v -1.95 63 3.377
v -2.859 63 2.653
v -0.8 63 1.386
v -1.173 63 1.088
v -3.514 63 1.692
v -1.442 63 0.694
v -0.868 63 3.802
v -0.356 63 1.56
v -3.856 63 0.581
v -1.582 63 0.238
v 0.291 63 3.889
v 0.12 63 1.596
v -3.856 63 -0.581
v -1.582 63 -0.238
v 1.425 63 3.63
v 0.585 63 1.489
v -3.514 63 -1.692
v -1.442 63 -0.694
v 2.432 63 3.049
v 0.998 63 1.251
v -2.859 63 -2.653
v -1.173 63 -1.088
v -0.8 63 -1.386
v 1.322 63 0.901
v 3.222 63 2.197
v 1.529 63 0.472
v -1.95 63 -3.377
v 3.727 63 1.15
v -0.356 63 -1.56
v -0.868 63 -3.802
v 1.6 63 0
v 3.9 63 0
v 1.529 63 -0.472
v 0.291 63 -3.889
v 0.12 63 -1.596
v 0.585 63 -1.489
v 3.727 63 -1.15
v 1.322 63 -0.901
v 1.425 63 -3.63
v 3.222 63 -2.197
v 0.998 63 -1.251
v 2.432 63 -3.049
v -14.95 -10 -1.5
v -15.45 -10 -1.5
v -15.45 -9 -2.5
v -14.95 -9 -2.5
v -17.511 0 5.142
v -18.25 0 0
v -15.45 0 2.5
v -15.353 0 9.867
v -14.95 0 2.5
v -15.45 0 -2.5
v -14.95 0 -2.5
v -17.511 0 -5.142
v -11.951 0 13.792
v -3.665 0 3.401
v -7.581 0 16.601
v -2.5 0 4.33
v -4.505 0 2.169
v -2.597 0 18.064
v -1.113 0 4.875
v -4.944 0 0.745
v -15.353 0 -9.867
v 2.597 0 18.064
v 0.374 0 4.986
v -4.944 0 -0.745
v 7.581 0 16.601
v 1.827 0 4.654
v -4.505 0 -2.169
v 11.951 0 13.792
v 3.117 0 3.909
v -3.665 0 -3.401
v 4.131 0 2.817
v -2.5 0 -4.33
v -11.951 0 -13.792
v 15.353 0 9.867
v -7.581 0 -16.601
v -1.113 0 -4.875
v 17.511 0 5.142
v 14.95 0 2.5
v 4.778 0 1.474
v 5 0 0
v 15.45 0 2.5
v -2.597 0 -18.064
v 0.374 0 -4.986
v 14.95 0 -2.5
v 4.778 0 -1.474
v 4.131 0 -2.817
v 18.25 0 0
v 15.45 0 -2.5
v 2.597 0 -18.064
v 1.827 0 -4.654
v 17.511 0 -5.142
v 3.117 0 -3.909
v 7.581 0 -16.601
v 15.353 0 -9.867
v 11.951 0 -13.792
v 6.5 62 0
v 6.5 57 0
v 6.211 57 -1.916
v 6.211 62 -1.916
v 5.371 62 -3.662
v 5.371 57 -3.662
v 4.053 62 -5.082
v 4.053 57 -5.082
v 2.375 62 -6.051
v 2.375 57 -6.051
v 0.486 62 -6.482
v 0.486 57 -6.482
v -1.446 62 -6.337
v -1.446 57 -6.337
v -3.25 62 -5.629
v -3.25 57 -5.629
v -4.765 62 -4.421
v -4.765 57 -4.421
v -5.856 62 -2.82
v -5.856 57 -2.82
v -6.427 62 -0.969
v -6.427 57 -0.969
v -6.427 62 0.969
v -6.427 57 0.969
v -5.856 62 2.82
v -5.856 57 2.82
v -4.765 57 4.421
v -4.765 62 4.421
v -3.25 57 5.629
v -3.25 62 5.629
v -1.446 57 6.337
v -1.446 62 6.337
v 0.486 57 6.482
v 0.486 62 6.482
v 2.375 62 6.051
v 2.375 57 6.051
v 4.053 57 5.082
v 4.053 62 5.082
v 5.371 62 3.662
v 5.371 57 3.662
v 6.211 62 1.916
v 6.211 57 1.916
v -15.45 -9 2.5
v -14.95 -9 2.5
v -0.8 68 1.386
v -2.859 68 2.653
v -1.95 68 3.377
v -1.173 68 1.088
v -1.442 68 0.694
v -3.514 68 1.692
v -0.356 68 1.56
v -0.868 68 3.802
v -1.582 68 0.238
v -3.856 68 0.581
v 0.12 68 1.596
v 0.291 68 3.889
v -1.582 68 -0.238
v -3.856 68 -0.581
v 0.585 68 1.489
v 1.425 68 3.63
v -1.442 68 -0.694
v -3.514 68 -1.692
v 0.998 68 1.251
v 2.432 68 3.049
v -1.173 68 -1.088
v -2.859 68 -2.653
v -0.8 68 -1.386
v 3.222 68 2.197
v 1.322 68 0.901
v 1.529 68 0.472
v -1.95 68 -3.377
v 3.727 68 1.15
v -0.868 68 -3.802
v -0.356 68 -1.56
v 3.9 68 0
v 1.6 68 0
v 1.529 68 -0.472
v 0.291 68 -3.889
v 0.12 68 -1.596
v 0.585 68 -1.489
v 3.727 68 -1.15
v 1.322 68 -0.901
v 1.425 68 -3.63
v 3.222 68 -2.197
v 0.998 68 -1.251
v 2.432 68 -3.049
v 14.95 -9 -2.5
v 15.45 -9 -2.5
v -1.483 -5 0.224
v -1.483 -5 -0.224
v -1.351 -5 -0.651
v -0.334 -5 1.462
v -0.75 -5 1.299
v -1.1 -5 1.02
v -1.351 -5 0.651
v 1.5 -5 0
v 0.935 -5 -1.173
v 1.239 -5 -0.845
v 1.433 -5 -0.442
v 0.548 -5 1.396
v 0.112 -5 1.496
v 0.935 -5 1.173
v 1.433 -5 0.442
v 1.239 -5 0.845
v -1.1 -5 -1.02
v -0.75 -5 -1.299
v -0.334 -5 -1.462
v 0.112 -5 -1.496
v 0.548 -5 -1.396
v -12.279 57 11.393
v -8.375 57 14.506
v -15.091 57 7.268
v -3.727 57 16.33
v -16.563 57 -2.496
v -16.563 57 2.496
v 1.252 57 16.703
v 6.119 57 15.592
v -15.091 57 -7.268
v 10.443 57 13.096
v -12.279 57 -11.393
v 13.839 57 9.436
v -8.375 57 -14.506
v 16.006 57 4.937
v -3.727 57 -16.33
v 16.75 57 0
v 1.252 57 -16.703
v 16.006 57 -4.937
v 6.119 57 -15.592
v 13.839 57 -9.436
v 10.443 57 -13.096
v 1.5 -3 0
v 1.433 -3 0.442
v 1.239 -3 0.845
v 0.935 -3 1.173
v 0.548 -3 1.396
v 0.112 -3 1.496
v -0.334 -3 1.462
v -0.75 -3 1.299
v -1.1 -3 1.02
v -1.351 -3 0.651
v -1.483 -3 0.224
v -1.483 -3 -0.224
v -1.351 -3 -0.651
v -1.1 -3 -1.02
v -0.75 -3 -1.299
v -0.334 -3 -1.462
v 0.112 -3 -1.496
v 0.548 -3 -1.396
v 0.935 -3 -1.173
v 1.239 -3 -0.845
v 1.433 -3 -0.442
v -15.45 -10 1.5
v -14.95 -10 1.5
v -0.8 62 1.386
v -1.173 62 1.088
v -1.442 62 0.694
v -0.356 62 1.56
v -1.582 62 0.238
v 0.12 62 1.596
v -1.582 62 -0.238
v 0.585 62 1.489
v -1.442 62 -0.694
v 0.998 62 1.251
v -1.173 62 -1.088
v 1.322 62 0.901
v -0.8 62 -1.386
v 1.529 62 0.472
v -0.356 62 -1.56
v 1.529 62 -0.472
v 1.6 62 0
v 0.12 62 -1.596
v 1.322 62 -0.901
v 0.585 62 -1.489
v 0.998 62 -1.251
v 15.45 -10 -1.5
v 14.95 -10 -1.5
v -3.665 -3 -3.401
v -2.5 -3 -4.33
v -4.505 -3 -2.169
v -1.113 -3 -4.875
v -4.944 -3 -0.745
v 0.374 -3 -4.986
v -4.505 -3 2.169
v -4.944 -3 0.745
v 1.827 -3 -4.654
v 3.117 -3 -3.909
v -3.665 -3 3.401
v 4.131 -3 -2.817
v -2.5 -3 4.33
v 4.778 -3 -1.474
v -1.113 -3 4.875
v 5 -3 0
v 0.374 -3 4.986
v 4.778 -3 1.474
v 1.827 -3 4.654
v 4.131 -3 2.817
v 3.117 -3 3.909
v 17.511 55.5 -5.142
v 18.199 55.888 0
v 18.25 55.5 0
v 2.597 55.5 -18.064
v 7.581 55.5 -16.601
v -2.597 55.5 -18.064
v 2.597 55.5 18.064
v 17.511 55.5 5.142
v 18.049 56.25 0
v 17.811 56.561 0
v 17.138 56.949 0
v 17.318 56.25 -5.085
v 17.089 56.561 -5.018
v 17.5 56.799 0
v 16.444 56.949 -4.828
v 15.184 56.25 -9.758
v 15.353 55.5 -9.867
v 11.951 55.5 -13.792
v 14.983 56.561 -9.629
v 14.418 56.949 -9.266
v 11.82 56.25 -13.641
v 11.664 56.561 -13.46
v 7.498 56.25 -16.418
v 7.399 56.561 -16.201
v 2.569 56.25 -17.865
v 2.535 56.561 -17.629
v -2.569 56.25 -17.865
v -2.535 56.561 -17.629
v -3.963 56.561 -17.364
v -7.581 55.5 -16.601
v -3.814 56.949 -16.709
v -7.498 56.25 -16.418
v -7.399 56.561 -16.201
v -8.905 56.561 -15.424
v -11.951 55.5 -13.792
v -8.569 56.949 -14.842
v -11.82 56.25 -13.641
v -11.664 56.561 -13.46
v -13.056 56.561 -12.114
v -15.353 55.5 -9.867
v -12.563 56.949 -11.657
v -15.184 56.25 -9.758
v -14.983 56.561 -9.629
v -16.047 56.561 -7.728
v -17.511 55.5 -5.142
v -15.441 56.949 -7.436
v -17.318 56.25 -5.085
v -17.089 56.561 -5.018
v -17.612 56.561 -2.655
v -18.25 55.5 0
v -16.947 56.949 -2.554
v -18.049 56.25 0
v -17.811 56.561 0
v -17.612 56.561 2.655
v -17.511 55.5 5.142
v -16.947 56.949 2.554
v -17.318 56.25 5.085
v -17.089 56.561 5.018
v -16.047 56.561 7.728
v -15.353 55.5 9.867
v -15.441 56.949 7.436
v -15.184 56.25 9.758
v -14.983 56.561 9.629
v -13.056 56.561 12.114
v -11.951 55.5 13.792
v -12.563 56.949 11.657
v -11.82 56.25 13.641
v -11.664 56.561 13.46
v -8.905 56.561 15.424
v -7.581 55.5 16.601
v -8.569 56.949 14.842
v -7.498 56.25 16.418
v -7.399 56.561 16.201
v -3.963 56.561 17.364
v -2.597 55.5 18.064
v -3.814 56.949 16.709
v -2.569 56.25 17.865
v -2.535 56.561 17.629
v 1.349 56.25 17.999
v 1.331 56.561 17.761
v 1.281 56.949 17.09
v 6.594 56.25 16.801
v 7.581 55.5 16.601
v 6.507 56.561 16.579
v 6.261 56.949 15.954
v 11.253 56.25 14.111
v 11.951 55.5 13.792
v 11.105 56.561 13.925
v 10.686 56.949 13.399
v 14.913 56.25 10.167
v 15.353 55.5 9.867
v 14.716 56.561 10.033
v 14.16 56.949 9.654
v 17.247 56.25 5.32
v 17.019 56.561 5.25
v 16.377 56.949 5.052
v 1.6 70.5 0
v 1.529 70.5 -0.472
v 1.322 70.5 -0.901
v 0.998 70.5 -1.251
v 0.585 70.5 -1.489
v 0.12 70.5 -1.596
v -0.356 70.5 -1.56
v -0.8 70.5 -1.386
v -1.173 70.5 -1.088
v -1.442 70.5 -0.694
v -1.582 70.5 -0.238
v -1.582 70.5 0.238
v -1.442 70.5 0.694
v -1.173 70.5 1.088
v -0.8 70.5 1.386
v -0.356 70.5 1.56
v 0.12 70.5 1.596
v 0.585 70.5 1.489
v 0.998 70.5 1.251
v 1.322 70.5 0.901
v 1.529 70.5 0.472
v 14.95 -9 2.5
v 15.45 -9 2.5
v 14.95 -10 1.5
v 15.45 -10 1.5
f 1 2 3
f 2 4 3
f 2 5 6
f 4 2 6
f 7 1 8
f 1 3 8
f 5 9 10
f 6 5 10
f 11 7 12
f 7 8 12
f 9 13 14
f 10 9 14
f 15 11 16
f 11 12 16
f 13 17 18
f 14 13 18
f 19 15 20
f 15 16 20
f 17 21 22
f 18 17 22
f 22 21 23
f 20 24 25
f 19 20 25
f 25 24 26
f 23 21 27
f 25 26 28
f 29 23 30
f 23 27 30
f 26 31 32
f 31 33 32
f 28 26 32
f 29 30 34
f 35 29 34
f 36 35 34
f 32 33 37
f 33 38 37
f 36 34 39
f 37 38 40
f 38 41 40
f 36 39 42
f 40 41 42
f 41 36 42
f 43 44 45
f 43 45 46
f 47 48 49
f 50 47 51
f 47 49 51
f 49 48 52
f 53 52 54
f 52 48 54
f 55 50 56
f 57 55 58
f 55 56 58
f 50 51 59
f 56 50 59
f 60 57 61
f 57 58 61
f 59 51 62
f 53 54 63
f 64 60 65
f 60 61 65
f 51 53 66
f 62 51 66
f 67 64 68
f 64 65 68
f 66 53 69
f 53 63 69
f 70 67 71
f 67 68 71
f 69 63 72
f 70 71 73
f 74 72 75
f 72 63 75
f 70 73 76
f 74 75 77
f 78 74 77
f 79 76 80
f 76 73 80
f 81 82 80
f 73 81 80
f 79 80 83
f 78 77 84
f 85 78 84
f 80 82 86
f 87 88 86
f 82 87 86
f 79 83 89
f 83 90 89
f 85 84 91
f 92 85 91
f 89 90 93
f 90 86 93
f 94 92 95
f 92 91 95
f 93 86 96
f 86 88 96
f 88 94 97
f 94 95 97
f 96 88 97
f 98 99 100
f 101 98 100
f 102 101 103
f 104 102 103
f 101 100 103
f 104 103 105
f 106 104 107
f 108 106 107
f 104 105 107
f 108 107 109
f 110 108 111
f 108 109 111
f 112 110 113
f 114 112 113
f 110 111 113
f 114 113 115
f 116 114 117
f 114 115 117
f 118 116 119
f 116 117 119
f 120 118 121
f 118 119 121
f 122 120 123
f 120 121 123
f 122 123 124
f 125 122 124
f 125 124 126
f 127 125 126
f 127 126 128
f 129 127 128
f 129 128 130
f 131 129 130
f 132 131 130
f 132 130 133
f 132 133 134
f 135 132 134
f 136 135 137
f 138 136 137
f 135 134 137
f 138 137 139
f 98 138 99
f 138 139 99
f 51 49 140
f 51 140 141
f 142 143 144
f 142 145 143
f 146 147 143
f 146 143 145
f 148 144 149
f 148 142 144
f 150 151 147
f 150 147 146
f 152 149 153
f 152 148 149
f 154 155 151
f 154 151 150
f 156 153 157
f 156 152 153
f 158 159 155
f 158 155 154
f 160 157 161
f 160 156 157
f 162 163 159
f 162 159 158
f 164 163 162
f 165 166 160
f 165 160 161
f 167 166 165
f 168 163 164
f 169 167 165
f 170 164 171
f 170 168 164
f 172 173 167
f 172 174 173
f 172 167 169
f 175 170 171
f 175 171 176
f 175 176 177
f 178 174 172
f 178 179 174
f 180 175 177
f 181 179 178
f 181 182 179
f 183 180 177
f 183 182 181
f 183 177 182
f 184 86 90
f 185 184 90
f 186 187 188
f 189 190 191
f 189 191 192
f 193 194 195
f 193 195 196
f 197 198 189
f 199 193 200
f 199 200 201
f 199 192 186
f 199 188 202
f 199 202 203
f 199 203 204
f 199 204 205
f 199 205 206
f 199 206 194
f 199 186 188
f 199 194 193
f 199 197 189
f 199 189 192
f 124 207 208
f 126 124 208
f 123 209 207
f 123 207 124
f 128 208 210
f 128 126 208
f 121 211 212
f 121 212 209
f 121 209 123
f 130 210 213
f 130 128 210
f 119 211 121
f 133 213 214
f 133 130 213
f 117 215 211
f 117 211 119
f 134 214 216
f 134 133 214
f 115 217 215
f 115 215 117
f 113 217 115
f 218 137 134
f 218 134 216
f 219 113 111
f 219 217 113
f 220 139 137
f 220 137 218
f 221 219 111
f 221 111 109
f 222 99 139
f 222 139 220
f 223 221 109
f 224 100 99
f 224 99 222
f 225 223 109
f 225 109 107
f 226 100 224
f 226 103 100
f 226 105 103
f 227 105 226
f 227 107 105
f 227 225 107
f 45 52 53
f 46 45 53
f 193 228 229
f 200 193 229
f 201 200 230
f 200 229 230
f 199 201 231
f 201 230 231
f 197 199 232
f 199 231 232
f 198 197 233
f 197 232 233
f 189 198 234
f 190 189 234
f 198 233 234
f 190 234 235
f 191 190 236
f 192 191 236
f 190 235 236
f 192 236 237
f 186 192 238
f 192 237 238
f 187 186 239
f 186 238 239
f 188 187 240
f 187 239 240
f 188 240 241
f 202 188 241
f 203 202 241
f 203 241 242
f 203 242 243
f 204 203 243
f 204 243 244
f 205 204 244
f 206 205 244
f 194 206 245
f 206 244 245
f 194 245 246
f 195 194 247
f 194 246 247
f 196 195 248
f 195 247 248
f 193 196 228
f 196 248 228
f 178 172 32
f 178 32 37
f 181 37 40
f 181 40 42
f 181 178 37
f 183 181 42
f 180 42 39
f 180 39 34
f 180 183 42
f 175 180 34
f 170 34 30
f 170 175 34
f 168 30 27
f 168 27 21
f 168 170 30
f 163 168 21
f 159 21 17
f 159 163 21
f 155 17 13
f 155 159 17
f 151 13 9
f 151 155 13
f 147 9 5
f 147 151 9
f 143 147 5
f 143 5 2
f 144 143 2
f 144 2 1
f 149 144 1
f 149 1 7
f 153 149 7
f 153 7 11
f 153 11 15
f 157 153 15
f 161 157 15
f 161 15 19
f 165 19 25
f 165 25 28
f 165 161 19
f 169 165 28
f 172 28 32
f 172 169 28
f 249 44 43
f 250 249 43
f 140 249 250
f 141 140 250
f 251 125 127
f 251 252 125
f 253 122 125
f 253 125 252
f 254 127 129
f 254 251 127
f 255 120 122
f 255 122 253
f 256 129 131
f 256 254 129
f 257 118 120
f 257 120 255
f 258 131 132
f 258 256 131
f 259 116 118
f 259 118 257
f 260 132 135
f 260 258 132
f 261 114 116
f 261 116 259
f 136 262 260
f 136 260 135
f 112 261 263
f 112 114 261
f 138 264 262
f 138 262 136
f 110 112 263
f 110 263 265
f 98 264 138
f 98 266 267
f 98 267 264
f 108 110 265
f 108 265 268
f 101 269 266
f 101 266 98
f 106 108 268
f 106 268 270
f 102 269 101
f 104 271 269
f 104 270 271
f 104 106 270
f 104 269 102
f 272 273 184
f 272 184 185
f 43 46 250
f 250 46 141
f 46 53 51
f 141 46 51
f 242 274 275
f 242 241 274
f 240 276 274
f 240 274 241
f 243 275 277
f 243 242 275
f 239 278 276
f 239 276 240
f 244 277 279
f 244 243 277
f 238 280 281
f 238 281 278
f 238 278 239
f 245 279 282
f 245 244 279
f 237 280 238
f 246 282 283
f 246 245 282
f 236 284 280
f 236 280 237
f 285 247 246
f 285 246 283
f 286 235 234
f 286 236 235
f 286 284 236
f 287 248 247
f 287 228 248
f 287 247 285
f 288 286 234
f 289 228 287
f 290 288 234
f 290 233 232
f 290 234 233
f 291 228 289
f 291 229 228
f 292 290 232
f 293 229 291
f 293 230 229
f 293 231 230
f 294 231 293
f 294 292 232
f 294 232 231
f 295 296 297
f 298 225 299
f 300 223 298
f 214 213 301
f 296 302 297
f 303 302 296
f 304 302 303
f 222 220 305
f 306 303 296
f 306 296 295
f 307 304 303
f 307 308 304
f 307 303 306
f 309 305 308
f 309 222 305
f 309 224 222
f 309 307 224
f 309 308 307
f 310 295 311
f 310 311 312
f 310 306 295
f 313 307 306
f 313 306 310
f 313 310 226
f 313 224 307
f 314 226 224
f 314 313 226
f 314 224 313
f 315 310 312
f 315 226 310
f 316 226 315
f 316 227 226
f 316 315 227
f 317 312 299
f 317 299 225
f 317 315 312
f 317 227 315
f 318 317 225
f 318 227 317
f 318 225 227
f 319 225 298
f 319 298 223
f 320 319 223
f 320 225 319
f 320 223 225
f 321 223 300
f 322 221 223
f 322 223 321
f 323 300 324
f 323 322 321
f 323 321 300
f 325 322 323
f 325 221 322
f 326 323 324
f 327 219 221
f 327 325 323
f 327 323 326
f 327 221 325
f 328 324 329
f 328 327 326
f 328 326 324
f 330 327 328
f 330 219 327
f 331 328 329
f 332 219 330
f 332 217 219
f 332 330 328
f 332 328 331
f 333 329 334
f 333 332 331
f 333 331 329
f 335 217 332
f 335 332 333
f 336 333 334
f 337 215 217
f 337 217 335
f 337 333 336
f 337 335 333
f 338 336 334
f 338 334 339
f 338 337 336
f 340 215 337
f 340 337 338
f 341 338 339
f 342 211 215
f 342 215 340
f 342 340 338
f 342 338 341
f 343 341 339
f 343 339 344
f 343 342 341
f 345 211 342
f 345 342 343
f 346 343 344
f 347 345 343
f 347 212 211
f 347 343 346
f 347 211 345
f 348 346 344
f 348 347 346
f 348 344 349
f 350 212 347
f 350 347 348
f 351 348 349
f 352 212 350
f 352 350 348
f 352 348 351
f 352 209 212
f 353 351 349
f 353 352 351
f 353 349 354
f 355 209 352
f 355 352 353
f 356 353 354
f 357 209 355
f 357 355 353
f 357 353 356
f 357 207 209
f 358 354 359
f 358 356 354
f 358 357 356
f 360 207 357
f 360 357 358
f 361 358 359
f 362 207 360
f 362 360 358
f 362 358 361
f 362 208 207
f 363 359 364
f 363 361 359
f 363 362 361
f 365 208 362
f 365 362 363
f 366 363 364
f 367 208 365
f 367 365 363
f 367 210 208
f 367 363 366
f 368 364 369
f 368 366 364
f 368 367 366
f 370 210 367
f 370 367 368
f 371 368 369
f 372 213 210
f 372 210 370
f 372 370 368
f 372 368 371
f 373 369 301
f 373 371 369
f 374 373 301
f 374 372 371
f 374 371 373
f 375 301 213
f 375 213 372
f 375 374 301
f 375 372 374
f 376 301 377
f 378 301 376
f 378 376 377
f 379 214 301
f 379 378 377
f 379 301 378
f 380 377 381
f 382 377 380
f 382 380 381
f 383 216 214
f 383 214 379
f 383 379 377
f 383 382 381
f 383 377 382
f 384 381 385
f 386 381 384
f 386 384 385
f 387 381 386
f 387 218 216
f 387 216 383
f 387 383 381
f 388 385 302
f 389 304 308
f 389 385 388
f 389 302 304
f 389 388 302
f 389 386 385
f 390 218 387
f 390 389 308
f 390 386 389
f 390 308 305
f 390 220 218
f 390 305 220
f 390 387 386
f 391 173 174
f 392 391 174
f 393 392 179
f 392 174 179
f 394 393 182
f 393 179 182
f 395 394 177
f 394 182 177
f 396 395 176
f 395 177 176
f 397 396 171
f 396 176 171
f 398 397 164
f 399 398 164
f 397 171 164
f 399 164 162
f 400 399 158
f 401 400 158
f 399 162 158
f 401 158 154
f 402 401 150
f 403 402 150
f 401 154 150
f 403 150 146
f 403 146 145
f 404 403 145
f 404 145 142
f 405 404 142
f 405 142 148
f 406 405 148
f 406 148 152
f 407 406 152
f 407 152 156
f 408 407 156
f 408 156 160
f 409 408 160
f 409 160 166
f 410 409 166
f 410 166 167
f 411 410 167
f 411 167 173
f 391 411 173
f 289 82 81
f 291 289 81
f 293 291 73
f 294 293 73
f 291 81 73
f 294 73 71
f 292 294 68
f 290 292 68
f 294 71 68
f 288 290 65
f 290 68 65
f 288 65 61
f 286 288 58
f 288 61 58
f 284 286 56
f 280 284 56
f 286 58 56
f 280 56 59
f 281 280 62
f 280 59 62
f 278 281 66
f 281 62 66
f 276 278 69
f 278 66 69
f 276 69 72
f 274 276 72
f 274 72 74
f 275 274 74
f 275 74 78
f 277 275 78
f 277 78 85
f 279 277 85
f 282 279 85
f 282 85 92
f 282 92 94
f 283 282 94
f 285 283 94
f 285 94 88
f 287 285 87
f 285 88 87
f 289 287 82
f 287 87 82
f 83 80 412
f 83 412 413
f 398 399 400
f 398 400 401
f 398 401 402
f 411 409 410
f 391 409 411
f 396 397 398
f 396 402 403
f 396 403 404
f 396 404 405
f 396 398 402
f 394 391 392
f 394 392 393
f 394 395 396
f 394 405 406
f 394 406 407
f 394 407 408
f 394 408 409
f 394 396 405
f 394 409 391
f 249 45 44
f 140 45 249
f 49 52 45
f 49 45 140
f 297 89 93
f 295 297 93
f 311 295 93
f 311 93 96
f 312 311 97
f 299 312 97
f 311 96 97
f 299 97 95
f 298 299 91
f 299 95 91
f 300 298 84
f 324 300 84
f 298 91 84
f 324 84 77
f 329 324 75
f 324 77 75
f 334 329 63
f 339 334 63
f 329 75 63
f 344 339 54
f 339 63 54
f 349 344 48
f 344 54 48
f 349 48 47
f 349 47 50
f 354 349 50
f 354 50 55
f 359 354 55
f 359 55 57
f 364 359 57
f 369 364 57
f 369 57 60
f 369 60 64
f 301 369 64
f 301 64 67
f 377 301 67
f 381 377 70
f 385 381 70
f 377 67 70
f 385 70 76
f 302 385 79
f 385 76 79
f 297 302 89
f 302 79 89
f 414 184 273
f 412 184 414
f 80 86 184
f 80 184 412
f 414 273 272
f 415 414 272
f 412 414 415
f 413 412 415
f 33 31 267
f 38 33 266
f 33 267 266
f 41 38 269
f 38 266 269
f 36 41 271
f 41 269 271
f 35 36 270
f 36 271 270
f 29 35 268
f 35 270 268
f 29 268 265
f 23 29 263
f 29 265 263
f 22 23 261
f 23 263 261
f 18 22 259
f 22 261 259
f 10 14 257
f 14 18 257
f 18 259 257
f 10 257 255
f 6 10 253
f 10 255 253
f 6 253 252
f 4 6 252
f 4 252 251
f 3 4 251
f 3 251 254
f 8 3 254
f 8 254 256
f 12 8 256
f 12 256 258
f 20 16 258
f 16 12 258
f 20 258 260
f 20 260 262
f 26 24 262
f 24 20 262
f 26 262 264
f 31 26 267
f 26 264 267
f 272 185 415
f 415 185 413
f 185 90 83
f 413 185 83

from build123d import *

# Parameters (mm, degrees)
SKETCH1_R           = 18.25
BOSS_EXTRUDE1_DEPTH = 57
SKETCH2_R           = 6.5
BOSS_EXTRUDE2_DEPTH = 5
FILLET1_R           = 1.5
SKETCH3_R           = 1.6
BOSS_EXTRUDE3_DEPTH = 8.5
BOSS_EXTRUDE4_START = -2.5
SKETCH4_R           = 3.9
BOSS_EXTRUDE4_DEPTH = 5
SKETCH5_R           = 5
BOSS_EXTRUDE5_DEPTH = 3
SKETCH6_R           = 1.5
BOSS_EXTRUDE6_DEPTH = 2
SKETCH7_W           = 0.5
SKETCH7_H           = 5
BOSS_EXTRUDE7_DEPTH = 10
CHAMFER1_SIZE       = 1


with BuildPart() as part:
    # Sketch1 → Boss-Extrude1 (new body)
    with BuildSketch(Plane(origin=(0, 0, 0), x_dir=(1, 0, 0), z_dir=(0, 1, 0))):
        Circle(SKETCH1_R)
    extrude(amount=BOSS_EXTRUDE1_DEPTH)

    # Sketch2 → Boss-Extrude2 (add)
    with BuildSketch(Plane(origin=(0, 57, 0), x_dir=(1, 0, 0), z_dir=(0, 1, 0))):
        Circle(SKETCH2_R)
    extrude(amount=BOSS_EXTRUDE2_DEPTH)

    # Fillet1
    fillet1_edges = [part.edges().sort_by_distance(p)[0] for p in [
        (-18.25, 57, 0),
    ]]
    fillet(fillet1_edges, radius=FILLET1_R)

    # Sketch3 → Boss-Extrude3 (add)
    with BuildSketch(Plane(origin=(0, 62, 0), x_dir=(1, 0, 0), z_dir=(0, 1, 0))):
        Circle(SKETCH3_R)
    extrude(amount=BOSS_EXTRUDE3_DEPTH)

    # Sketch4 → Boss-Extrude4 (add)
    with BuildSketch(Plane(origin=(0, 70.5, 0), x_dir=(1, 0, 0), z_dir=(0, 1, 0)).offset(BOSS_EXTRUDE4_START)):
        Circle(SKETCH4_R)
    extrude(amount=-BOSS_EXTRUDE4_DEPTH)

    # Sketch5 → Boss-Extrude5 (add)
    with BuildSketch(Plane.XZ):
        Circle(SKETCH5_R)
    extrude(amount=BOSS_EXTRUDE5_DEPTH)

    # Sketch6 → Boss-Extrude6 (add)
    with BuildSketch(Plane.XZ.offset(3)):
        Circle(SKETCH6_R)
    extrude(amount=BOSS_EXTRUDE6_DEPTH)

    # Sketch7 → Boss-Extrude7 (add)
    with BuildSketch(Plane.XZ):
        with Locations((15.2, 0)):
            Rectangle(SKETCH7_W, SKETCH7_H)
        with Locations((-15.2, 0)):
            Rectangle(SKETCH7_W, SKETCH7_H)
    extrude(amount=BOSS_EXTRUDE7_DEPTH)

    # Chamfer1
    chamfer1_edges = [part.edges().sort_by_distance(p)[0] for p in [
        (15.2, -10, -2.5),
        (15.2, -10, 2.5),
        (-15.2, -10, -2.5),
        (-15.2, -10, 2.5),
    ]]
    chamfer(chamfer1_edges, length=CHAMFER1_SIZE)


solid = part.part
